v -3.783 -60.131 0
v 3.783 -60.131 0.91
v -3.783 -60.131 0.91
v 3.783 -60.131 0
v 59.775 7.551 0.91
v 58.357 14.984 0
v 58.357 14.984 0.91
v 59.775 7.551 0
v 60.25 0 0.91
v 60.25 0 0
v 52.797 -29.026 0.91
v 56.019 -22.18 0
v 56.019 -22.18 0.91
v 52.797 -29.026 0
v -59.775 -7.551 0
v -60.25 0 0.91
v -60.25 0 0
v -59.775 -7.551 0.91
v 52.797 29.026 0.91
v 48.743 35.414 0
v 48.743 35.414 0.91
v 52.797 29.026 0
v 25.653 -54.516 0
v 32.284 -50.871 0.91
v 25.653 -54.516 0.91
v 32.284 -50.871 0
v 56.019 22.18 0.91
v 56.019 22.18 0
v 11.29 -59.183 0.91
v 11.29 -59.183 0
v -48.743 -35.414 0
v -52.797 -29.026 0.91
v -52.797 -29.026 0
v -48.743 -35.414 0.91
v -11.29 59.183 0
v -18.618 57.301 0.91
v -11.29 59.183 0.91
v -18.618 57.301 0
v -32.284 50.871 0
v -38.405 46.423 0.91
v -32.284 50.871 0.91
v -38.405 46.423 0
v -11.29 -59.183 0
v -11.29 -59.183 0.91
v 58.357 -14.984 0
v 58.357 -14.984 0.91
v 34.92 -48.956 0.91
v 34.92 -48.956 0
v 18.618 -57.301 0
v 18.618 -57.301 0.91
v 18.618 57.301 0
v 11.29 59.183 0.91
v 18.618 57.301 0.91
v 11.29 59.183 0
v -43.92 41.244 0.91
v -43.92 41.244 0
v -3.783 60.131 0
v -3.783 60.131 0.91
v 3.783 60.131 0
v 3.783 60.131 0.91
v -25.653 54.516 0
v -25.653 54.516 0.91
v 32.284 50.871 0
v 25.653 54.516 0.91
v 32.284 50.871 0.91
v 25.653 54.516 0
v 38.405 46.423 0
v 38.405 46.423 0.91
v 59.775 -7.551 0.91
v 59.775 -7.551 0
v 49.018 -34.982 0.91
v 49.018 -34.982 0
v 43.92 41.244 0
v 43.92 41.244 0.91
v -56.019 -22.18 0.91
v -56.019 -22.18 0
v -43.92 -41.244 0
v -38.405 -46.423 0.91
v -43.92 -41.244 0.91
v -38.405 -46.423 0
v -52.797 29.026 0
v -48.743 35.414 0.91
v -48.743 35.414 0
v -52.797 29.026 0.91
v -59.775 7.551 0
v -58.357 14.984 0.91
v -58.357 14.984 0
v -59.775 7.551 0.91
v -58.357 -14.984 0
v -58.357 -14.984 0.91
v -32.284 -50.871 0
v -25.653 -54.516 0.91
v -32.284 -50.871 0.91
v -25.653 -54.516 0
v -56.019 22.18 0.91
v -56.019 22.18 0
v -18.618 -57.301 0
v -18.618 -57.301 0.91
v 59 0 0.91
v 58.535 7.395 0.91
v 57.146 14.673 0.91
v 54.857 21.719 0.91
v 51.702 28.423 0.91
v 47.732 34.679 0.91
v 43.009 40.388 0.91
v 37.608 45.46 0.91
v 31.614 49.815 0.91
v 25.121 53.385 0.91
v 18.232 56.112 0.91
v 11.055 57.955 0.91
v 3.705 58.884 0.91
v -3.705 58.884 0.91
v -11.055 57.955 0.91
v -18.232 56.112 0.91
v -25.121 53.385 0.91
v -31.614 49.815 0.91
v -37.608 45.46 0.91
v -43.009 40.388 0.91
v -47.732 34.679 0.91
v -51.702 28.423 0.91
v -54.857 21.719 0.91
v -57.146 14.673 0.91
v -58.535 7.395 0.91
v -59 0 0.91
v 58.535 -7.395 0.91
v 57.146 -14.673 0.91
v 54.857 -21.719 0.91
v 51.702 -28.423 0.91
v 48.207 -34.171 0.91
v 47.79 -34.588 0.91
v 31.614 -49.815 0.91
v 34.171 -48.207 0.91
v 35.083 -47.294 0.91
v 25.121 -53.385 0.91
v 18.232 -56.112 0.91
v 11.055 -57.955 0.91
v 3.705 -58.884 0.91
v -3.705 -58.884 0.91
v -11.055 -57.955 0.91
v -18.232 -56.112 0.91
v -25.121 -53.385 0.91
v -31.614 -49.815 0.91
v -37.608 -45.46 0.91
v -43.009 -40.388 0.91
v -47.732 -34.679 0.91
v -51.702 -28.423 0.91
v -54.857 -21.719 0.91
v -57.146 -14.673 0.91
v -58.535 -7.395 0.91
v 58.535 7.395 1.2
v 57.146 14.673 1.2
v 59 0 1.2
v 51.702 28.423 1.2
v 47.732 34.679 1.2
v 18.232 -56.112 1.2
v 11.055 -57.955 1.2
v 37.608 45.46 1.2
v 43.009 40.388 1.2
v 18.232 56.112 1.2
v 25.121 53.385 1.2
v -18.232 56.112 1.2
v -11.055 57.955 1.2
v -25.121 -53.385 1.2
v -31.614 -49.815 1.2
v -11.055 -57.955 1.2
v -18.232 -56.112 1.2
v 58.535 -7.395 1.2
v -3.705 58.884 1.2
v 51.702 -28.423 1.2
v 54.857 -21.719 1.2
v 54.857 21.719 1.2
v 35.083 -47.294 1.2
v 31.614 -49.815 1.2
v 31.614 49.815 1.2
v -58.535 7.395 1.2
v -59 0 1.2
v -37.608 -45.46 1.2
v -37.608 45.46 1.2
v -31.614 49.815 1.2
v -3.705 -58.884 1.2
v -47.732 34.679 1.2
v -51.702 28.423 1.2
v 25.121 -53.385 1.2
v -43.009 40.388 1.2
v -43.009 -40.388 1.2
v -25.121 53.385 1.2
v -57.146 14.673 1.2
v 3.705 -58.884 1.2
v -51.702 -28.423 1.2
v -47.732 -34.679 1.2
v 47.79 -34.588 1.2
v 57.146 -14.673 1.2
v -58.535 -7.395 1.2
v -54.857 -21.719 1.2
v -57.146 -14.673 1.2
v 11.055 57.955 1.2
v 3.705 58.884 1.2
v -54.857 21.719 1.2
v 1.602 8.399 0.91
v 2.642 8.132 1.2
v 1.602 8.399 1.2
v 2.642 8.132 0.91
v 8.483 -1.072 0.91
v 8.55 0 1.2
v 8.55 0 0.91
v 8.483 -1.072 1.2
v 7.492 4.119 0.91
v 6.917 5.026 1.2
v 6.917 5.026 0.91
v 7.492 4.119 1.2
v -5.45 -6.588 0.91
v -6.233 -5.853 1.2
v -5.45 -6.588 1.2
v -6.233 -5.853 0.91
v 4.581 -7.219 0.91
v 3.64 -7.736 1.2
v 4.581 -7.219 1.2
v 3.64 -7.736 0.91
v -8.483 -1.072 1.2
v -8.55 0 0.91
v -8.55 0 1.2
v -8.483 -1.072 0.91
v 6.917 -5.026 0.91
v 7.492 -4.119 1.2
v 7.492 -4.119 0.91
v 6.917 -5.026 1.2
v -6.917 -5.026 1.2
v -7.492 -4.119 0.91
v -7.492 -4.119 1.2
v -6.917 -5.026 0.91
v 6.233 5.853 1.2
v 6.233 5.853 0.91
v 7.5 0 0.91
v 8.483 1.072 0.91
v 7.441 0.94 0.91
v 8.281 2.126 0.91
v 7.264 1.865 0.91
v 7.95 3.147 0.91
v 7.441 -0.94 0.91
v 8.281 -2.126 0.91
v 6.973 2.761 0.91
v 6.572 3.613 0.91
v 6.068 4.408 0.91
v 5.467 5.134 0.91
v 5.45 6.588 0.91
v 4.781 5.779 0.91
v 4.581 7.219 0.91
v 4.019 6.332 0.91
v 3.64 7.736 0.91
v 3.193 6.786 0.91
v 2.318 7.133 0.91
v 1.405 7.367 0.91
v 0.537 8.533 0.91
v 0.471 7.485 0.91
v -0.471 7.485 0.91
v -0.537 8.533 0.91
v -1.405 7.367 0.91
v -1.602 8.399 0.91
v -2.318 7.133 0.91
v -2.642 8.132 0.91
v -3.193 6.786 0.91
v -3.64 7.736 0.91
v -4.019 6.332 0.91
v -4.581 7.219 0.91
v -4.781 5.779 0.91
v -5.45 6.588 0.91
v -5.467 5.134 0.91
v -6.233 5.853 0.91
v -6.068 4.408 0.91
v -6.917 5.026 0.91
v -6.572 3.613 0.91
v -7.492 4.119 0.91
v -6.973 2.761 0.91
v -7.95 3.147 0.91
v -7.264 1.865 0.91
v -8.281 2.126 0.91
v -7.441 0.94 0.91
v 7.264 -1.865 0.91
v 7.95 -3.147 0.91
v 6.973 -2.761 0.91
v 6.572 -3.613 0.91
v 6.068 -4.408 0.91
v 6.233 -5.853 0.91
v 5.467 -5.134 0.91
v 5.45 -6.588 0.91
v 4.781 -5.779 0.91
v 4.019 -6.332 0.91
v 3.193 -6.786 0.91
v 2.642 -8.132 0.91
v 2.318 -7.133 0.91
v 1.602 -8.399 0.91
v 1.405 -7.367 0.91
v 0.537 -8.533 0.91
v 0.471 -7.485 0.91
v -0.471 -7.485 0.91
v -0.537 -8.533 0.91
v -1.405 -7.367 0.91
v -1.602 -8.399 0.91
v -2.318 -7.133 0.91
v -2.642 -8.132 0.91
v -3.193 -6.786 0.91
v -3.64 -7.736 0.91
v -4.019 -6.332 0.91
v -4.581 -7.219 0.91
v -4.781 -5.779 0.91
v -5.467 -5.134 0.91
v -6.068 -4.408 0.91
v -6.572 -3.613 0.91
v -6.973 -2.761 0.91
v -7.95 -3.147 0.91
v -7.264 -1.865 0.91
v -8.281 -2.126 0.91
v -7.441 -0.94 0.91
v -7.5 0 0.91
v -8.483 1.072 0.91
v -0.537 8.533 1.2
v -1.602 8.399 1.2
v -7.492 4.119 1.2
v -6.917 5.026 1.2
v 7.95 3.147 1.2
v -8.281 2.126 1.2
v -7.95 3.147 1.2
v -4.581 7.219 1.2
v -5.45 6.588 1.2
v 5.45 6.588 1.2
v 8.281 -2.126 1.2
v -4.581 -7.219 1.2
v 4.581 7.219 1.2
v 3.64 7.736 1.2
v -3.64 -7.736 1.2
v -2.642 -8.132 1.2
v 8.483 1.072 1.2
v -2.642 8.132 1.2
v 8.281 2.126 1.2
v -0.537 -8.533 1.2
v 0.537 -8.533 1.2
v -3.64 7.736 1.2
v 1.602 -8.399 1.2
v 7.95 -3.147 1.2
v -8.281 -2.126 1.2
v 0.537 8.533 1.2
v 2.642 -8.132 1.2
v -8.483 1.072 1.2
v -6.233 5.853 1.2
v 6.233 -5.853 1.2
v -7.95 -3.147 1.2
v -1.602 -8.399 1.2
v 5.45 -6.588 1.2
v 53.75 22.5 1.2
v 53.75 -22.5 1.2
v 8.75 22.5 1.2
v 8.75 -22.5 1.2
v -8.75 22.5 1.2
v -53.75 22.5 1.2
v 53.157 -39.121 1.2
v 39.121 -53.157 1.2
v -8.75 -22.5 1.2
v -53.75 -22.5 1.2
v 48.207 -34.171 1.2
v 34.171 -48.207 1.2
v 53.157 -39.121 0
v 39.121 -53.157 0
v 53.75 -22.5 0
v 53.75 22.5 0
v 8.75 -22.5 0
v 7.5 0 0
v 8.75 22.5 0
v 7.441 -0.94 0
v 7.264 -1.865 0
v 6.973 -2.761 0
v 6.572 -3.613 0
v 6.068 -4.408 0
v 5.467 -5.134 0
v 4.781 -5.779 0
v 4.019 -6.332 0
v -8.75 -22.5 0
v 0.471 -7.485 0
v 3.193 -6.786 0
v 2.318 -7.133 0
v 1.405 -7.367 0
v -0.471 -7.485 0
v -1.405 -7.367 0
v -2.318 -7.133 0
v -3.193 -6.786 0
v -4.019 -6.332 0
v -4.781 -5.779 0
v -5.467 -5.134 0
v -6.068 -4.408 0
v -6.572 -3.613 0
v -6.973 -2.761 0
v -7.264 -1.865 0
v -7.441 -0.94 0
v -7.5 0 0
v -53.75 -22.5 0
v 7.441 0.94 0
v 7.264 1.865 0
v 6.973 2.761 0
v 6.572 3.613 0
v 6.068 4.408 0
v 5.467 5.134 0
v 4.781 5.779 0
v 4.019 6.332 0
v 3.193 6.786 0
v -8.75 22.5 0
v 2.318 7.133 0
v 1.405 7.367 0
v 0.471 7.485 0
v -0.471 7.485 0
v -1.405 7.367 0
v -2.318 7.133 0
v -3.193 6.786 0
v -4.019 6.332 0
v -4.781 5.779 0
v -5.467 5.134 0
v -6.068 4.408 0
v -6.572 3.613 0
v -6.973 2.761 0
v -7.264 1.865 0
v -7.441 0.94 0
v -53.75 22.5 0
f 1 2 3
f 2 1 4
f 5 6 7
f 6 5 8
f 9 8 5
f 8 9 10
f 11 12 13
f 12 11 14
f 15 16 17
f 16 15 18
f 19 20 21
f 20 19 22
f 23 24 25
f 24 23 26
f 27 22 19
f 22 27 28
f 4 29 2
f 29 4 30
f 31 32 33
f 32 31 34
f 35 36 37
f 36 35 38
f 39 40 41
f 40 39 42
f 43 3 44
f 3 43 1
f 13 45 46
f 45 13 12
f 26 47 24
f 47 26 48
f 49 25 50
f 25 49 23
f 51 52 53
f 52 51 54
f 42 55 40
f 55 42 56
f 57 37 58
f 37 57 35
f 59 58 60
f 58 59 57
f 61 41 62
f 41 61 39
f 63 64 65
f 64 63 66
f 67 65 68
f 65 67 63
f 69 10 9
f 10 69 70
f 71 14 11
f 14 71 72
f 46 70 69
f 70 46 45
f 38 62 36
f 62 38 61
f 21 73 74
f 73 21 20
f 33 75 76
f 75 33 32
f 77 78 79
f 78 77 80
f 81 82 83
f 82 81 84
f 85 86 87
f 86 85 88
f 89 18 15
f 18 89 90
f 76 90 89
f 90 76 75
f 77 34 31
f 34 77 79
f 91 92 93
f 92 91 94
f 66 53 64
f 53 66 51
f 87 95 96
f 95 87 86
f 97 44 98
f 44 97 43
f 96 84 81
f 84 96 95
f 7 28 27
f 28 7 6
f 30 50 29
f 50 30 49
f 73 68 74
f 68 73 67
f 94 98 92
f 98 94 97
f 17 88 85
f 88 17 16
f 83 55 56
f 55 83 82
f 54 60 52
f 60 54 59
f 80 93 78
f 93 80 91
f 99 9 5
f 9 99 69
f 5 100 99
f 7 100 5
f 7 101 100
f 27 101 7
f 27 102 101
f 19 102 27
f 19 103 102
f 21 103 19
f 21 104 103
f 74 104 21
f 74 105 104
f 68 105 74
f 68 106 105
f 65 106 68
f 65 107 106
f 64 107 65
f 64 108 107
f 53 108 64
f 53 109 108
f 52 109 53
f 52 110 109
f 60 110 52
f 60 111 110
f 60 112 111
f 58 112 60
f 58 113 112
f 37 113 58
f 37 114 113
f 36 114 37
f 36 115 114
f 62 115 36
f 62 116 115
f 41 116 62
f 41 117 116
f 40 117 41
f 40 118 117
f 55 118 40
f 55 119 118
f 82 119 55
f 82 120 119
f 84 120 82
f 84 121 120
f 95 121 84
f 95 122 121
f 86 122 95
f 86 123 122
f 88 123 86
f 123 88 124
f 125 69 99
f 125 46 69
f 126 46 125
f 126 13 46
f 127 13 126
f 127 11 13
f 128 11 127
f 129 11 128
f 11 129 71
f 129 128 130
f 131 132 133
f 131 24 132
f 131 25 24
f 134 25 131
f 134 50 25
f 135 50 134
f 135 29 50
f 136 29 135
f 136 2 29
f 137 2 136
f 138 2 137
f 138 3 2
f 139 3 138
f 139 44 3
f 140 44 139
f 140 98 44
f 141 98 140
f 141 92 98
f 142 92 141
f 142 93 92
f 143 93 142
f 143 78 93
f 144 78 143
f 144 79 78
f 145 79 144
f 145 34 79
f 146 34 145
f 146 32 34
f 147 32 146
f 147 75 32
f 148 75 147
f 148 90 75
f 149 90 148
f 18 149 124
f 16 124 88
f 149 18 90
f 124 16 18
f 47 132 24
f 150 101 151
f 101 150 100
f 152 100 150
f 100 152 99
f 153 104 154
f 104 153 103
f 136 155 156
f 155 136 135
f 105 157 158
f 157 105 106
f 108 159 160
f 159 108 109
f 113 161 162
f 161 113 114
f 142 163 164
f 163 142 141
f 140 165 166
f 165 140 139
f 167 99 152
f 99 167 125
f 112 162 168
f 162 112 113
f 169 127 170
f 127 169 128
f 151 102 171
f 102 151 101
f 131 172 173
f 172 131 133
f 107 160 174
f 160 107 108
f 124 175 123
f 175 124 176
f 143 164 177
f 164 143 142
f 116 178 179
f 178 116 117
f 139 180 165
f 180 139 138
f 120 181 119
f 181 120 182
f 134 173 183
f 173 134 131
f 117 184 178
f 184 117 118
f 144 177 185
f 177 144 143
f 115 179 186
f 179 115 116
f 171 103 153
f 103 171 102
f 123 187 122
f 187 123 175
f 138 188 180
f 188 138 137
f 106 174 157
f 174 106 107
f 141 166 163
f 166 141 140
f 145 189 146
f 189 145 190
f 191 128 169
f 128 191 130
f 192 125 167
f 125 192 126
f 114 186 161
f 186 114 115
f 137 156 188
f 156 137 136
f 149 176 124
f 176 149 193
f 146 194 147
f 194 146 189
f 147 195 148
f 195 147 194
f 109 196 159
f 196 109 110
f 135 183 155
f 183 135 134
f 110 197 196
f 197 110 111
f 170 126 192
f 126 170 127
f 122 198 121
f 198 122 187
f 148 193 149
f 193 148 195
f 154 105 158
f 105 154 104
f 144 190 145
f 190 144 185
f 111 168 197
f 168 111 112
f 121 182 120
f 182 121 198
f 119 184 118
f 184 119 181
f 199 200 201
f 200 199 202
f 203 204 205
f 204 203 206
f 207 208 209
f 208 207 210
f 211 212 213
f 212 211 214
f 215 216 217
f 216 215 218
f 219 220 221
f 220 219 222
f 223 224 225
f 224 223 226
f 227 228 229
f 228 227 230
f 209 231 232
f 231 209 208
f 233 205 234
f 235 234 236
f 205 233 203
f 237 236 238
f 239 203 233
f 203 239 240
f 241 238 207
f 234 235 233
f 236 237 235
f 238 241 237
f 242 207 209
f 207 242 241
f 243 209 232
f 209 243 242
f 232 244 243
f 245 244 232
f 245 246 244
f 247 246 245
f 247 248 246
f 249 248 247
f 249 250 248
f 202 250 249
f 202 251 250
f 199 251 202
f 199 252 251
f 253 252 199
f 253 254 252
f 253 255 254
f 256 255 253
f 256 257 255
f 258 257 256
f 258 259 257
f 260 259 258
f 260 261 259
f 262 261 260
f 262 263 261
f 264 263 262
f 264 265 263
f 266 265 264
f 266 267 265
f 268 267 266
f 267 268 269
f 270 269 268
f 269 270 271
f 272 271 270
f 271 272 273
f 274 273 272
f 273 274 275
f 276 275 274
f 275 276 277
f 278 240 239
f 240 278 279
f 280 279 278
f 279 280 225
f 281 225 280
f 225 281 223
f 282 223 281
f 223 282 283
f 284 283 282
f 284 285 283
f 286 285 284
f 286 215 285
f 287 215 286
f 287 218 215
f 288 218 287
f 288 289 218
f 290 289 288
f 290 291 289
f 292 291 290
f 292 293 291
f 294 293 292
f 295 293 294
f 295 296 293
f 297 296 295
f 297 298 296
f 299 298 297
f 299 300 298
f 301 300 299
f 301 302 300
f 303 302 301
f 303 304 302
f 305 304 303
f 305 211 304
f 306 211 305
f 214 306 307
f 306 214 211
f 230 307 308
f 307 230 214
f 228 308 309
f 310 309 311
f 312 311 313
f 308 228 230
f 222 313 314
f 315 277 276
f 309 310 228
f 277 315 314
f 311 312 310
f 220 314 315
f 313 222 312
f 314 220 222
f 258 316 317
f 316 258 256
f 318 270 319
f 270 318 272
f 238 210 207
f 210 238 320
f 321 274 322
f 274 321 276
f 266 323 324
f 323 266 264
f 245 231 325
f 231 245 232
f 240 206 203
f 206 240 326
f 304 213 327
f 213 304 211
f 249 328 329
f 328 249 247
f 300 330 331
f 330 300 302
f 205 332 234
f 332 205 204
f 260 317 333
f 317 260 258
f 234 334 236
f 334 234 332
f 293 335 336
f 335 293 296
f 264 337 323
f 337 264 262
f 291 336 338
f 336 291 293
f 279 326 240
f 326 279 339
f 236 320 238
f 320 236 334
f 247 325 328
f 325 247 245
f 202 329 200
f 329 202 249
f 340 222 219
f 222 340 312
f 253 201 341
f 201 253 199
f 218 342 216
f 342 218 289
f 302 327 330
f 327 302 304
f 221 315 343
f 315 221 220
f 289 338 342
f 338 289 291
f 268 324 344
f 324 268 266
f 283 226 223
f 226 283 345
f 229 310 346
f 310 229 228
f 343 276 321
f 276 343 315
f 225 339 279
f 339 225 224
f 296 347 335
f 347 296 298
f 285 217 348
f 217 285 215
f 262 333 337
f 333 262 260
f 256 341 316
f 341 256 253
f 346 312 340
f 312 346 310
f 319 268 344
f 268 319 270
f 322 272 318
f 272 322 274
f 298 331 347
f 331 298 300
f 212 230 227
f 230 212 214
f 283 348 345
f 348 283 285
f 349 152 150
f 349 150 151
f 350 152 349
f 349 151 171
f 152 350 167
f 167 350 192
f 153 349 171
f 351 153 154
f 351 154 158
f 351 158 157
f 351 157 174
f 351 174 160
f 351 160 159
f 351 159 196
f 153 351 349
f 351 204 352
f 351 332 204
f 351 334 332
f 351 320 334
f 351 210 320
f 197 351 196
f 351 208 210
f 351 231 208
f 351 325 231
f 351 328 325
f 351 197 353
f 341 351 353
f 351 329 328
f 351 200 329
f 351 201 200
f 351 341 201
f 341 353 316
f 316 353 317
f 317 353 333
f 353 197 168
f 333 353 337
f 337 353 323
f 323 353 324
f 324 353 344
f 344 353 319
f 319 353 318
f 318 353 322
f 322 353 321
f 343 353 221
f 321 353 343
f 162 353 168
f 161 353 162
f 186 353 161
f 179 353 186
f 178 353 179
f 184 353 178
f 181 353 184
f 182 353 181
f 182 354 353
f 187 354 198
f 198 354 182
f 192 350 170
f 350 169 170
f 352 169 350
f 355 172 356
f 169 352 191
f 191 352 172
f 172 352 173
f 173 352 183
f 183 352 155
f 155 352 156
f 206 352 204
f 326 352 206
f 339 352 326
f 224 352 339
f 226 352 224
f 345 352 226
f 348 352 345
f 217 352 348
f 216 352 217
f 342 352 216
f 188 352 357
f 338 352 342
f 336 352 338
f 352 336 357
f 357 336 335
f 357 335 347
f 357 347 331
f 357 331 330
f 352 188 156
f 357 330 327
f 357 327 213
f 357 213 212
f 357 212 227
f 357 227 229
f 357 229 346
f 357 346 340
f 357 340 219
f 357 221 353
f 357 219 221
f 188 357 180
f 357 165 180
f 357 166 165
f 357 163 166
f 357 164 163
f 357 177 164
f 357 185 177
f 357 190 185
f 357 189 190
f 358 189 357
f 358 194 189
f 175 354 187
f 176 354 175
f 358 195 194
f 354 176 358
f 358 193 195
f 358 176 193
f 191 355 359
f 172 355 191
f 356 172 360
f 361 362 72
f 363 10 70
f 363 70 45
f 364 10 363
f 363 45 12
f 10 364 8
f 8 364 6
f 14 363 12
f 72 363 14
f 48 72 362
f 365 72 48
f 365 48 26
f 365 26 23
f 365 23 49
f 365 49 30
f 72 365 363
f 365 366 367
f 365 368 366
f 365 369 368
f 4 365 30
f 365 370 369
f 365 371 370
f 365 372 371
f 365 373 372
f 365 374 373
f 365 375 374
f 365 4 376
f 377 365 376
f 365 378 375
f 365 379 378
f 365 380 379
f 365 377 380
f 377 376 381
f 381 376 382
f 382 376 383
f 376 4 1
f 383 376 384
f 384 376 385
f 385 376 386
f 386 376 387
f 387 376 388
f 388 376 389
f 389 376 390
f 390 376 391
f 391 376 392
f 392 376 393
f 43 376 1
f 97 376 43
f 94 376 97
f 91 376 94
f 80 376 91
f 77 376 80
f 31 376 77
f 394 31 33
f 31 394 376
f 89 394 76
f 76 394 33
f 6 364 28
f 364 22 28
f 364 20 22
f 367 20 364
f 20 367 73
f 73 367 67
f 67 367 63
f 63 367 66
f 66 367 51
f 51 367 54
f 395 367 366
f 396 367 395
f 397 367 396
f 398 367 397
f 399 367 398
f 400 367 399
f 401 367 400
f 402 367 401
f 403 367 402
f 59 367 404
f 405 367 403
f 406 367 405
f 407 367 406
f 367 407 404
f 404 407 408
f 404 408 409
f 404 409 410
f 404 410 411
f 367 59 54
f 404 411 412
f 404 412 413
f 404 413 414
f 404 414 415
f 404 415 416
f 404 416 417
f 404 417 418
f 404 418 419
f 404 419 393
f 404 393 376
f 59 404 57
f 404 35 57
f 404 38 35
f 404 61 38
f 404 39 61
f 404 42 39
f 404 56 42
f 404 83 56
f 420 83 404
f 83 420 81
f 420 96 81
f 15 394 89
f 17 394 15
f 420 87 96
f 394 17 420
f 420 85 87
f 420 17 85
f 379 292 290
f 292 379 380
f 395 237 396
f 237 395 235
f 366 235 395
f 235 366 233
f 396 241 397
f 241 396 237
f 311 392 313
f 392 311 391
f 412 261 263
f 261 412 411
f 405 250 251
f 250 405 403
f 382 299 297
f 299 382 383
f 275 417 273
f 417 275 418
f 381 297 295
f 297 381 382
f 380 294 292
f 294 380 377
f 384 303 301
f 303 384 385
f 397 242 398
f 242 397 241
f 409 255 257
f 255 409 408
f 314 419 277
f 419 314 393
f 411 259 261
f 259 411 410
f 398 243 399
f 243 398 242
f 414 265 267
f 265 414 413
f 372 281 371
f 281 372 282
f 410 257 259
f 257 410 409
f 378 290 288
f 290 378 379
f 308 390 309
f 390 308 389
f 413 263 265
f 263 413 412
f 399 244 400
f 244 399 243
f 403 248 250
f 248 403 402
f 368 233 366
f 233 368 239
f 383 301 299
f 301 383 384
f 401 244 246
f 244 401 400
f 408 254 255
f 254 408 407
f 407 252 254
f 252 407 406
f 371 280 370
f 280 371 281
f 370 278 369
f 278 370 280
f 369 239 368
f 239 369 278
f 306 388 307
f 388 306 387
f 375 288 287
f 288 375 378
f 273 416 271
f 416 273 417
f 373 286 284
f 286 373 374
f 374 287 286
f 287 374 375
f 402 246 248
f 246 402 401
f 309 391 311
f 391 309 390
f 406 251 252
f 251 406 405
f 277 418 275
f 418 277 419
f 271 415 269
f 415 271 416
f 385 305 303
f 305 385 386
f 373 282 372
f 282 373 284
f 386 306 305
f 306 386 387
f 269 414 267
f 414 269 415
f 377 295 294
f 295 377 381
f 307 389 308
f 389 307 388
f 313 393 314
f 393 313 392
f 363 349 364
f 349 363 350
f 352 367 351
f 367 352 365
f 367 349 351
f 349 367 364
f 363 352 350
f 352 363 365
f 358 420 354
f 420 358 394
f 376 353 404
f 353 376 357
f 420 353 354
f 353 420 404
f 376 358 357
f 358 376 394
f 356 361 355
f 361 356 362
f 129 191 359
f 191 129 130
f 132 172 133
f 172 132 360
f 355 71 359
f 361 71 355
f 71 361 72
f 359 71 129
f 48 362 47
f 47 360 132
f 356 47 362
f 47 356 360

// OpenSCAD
// Diameter of your tray's centre hole, if different from CD standard 15 mm
hole_diameter = 15.0;
// Outer diameter of your tray's recess. CD default is 120 but you can increase it for a better fit to your tray.
outer_diameter = 120.5;
// Tray thickness - you can match this to the recess of your CD tray or just use the default(safe) CD thickness of 1.2mm to avoid catching on your print head or printer's mechanism.
tray_thickness = 1.2;

// Add some tolerance (mm) to the tile holes. They are 45x45 exactly,, you can add some breathing room here for a looser fit if desired. 
tile_hole_tolerance = 0; //[0:0.05:1]

// How far the tile hole should be placed from the inner printable area limit. Use this to fine-tune your tile position in the holder.
tile_hole_offset = 0.2;

// Inner Diameter of your printable area on your printer.
inner_printable_diameter = 17.1;

// The largest printable diameter your printer will let you print on a CD.
outer_printable_diameter = 118;

// Lets you inset the printable area for visualization to make sure your tile holes will fit by recessing non-printable area slightly.
show_print_area = 1;//[0:No,1:Yes]

// If your disc tray has finger recesses, then you can enable this to add a protrusion to ensure the holder stays in the same position every print. Set width to 0 to disable.
alignment_tab_1_width = 19.85;
alignment_tab_1_depth = 5;

// The angle at which your alignment tab is located. 0 degrees = on the positive X axis.
alignment_tab_1_angle = -45;

// If your disc tray has finger recesses, then you can enable this to add a second protrusion to ensure the holder stays in the same position every print. Set width to 0 to disable.
alignment_tab_2_width = 0;
alignment_tab_2_depth = 5;

// The angle at which your alignment tab is located. 0 degrees = on the positive X axis.
alignment_tab_2_angle = 115;

module hub(){
    cylinder(tray_thickness+0.01,d=hole_diameter,$fn=50);
}

module tilehole(){
    tol_offset = tile_hole_tolerance/2;
    print_radius = inner_printable_diameter/2;
    translate([print_radius+tile_hole_offset+tol_offset,-22.5-tol_offset,-0.005]){
        cube(45+tile_hole_tolerance,45+tile_hole_tolerance,tray_thickness + 0.01);
    }
}

module printarea(){
    difference(){
        cylinder(0.3,d=outer_diameter,$fn=50);
        translate([0,0,-0.005]){
            cylinder(0.31,d=outer_printable_diameter,$fn=50);
        }
    }
        cylinder(0.3,d=inner_printable_diameter,$fn=50);
   
}


module disc(){
    difference(){
        cylinder(tray_thickness,d=outer_diameter,$fn=50);
        if (show_print_area==1){
    translate([0,0,tray_thickness-0.29]){
        printarea();
    }
}
    }
}

difference(){
    disc();
    translate([0,0,-0.005]){
        hub();
    }
    tilehole();
    rotate([0,0,-180]){
        tilehole();
    }
}

// Orientation protrusion 1
if (alignment_tab_1_width>0){
    rotate([0,0,alignment_tab_1_angle]){
        inner_dia = outer_diameter/2;
    translate([inner_dia-2,-alignment_tab_1_width/2,0]){
        cube([2+alignment_tab_1_depth,alignment_tab_1_width,,tray_thickness]);
    }
    }
}

// Orientation protrusion 2
if (alignment_tab_2_width>0){
    rotate([0,0,alignment_tab_2_angle]){
        inner_dia = outer_diameter/2;
    translate([inner_dia-2,-alignment_tab_2_width/2,0]){
        cube([2+alignment_tab_2_depth,alignment_tab_2_width,,tray_thickness]);
    }
    }
}
